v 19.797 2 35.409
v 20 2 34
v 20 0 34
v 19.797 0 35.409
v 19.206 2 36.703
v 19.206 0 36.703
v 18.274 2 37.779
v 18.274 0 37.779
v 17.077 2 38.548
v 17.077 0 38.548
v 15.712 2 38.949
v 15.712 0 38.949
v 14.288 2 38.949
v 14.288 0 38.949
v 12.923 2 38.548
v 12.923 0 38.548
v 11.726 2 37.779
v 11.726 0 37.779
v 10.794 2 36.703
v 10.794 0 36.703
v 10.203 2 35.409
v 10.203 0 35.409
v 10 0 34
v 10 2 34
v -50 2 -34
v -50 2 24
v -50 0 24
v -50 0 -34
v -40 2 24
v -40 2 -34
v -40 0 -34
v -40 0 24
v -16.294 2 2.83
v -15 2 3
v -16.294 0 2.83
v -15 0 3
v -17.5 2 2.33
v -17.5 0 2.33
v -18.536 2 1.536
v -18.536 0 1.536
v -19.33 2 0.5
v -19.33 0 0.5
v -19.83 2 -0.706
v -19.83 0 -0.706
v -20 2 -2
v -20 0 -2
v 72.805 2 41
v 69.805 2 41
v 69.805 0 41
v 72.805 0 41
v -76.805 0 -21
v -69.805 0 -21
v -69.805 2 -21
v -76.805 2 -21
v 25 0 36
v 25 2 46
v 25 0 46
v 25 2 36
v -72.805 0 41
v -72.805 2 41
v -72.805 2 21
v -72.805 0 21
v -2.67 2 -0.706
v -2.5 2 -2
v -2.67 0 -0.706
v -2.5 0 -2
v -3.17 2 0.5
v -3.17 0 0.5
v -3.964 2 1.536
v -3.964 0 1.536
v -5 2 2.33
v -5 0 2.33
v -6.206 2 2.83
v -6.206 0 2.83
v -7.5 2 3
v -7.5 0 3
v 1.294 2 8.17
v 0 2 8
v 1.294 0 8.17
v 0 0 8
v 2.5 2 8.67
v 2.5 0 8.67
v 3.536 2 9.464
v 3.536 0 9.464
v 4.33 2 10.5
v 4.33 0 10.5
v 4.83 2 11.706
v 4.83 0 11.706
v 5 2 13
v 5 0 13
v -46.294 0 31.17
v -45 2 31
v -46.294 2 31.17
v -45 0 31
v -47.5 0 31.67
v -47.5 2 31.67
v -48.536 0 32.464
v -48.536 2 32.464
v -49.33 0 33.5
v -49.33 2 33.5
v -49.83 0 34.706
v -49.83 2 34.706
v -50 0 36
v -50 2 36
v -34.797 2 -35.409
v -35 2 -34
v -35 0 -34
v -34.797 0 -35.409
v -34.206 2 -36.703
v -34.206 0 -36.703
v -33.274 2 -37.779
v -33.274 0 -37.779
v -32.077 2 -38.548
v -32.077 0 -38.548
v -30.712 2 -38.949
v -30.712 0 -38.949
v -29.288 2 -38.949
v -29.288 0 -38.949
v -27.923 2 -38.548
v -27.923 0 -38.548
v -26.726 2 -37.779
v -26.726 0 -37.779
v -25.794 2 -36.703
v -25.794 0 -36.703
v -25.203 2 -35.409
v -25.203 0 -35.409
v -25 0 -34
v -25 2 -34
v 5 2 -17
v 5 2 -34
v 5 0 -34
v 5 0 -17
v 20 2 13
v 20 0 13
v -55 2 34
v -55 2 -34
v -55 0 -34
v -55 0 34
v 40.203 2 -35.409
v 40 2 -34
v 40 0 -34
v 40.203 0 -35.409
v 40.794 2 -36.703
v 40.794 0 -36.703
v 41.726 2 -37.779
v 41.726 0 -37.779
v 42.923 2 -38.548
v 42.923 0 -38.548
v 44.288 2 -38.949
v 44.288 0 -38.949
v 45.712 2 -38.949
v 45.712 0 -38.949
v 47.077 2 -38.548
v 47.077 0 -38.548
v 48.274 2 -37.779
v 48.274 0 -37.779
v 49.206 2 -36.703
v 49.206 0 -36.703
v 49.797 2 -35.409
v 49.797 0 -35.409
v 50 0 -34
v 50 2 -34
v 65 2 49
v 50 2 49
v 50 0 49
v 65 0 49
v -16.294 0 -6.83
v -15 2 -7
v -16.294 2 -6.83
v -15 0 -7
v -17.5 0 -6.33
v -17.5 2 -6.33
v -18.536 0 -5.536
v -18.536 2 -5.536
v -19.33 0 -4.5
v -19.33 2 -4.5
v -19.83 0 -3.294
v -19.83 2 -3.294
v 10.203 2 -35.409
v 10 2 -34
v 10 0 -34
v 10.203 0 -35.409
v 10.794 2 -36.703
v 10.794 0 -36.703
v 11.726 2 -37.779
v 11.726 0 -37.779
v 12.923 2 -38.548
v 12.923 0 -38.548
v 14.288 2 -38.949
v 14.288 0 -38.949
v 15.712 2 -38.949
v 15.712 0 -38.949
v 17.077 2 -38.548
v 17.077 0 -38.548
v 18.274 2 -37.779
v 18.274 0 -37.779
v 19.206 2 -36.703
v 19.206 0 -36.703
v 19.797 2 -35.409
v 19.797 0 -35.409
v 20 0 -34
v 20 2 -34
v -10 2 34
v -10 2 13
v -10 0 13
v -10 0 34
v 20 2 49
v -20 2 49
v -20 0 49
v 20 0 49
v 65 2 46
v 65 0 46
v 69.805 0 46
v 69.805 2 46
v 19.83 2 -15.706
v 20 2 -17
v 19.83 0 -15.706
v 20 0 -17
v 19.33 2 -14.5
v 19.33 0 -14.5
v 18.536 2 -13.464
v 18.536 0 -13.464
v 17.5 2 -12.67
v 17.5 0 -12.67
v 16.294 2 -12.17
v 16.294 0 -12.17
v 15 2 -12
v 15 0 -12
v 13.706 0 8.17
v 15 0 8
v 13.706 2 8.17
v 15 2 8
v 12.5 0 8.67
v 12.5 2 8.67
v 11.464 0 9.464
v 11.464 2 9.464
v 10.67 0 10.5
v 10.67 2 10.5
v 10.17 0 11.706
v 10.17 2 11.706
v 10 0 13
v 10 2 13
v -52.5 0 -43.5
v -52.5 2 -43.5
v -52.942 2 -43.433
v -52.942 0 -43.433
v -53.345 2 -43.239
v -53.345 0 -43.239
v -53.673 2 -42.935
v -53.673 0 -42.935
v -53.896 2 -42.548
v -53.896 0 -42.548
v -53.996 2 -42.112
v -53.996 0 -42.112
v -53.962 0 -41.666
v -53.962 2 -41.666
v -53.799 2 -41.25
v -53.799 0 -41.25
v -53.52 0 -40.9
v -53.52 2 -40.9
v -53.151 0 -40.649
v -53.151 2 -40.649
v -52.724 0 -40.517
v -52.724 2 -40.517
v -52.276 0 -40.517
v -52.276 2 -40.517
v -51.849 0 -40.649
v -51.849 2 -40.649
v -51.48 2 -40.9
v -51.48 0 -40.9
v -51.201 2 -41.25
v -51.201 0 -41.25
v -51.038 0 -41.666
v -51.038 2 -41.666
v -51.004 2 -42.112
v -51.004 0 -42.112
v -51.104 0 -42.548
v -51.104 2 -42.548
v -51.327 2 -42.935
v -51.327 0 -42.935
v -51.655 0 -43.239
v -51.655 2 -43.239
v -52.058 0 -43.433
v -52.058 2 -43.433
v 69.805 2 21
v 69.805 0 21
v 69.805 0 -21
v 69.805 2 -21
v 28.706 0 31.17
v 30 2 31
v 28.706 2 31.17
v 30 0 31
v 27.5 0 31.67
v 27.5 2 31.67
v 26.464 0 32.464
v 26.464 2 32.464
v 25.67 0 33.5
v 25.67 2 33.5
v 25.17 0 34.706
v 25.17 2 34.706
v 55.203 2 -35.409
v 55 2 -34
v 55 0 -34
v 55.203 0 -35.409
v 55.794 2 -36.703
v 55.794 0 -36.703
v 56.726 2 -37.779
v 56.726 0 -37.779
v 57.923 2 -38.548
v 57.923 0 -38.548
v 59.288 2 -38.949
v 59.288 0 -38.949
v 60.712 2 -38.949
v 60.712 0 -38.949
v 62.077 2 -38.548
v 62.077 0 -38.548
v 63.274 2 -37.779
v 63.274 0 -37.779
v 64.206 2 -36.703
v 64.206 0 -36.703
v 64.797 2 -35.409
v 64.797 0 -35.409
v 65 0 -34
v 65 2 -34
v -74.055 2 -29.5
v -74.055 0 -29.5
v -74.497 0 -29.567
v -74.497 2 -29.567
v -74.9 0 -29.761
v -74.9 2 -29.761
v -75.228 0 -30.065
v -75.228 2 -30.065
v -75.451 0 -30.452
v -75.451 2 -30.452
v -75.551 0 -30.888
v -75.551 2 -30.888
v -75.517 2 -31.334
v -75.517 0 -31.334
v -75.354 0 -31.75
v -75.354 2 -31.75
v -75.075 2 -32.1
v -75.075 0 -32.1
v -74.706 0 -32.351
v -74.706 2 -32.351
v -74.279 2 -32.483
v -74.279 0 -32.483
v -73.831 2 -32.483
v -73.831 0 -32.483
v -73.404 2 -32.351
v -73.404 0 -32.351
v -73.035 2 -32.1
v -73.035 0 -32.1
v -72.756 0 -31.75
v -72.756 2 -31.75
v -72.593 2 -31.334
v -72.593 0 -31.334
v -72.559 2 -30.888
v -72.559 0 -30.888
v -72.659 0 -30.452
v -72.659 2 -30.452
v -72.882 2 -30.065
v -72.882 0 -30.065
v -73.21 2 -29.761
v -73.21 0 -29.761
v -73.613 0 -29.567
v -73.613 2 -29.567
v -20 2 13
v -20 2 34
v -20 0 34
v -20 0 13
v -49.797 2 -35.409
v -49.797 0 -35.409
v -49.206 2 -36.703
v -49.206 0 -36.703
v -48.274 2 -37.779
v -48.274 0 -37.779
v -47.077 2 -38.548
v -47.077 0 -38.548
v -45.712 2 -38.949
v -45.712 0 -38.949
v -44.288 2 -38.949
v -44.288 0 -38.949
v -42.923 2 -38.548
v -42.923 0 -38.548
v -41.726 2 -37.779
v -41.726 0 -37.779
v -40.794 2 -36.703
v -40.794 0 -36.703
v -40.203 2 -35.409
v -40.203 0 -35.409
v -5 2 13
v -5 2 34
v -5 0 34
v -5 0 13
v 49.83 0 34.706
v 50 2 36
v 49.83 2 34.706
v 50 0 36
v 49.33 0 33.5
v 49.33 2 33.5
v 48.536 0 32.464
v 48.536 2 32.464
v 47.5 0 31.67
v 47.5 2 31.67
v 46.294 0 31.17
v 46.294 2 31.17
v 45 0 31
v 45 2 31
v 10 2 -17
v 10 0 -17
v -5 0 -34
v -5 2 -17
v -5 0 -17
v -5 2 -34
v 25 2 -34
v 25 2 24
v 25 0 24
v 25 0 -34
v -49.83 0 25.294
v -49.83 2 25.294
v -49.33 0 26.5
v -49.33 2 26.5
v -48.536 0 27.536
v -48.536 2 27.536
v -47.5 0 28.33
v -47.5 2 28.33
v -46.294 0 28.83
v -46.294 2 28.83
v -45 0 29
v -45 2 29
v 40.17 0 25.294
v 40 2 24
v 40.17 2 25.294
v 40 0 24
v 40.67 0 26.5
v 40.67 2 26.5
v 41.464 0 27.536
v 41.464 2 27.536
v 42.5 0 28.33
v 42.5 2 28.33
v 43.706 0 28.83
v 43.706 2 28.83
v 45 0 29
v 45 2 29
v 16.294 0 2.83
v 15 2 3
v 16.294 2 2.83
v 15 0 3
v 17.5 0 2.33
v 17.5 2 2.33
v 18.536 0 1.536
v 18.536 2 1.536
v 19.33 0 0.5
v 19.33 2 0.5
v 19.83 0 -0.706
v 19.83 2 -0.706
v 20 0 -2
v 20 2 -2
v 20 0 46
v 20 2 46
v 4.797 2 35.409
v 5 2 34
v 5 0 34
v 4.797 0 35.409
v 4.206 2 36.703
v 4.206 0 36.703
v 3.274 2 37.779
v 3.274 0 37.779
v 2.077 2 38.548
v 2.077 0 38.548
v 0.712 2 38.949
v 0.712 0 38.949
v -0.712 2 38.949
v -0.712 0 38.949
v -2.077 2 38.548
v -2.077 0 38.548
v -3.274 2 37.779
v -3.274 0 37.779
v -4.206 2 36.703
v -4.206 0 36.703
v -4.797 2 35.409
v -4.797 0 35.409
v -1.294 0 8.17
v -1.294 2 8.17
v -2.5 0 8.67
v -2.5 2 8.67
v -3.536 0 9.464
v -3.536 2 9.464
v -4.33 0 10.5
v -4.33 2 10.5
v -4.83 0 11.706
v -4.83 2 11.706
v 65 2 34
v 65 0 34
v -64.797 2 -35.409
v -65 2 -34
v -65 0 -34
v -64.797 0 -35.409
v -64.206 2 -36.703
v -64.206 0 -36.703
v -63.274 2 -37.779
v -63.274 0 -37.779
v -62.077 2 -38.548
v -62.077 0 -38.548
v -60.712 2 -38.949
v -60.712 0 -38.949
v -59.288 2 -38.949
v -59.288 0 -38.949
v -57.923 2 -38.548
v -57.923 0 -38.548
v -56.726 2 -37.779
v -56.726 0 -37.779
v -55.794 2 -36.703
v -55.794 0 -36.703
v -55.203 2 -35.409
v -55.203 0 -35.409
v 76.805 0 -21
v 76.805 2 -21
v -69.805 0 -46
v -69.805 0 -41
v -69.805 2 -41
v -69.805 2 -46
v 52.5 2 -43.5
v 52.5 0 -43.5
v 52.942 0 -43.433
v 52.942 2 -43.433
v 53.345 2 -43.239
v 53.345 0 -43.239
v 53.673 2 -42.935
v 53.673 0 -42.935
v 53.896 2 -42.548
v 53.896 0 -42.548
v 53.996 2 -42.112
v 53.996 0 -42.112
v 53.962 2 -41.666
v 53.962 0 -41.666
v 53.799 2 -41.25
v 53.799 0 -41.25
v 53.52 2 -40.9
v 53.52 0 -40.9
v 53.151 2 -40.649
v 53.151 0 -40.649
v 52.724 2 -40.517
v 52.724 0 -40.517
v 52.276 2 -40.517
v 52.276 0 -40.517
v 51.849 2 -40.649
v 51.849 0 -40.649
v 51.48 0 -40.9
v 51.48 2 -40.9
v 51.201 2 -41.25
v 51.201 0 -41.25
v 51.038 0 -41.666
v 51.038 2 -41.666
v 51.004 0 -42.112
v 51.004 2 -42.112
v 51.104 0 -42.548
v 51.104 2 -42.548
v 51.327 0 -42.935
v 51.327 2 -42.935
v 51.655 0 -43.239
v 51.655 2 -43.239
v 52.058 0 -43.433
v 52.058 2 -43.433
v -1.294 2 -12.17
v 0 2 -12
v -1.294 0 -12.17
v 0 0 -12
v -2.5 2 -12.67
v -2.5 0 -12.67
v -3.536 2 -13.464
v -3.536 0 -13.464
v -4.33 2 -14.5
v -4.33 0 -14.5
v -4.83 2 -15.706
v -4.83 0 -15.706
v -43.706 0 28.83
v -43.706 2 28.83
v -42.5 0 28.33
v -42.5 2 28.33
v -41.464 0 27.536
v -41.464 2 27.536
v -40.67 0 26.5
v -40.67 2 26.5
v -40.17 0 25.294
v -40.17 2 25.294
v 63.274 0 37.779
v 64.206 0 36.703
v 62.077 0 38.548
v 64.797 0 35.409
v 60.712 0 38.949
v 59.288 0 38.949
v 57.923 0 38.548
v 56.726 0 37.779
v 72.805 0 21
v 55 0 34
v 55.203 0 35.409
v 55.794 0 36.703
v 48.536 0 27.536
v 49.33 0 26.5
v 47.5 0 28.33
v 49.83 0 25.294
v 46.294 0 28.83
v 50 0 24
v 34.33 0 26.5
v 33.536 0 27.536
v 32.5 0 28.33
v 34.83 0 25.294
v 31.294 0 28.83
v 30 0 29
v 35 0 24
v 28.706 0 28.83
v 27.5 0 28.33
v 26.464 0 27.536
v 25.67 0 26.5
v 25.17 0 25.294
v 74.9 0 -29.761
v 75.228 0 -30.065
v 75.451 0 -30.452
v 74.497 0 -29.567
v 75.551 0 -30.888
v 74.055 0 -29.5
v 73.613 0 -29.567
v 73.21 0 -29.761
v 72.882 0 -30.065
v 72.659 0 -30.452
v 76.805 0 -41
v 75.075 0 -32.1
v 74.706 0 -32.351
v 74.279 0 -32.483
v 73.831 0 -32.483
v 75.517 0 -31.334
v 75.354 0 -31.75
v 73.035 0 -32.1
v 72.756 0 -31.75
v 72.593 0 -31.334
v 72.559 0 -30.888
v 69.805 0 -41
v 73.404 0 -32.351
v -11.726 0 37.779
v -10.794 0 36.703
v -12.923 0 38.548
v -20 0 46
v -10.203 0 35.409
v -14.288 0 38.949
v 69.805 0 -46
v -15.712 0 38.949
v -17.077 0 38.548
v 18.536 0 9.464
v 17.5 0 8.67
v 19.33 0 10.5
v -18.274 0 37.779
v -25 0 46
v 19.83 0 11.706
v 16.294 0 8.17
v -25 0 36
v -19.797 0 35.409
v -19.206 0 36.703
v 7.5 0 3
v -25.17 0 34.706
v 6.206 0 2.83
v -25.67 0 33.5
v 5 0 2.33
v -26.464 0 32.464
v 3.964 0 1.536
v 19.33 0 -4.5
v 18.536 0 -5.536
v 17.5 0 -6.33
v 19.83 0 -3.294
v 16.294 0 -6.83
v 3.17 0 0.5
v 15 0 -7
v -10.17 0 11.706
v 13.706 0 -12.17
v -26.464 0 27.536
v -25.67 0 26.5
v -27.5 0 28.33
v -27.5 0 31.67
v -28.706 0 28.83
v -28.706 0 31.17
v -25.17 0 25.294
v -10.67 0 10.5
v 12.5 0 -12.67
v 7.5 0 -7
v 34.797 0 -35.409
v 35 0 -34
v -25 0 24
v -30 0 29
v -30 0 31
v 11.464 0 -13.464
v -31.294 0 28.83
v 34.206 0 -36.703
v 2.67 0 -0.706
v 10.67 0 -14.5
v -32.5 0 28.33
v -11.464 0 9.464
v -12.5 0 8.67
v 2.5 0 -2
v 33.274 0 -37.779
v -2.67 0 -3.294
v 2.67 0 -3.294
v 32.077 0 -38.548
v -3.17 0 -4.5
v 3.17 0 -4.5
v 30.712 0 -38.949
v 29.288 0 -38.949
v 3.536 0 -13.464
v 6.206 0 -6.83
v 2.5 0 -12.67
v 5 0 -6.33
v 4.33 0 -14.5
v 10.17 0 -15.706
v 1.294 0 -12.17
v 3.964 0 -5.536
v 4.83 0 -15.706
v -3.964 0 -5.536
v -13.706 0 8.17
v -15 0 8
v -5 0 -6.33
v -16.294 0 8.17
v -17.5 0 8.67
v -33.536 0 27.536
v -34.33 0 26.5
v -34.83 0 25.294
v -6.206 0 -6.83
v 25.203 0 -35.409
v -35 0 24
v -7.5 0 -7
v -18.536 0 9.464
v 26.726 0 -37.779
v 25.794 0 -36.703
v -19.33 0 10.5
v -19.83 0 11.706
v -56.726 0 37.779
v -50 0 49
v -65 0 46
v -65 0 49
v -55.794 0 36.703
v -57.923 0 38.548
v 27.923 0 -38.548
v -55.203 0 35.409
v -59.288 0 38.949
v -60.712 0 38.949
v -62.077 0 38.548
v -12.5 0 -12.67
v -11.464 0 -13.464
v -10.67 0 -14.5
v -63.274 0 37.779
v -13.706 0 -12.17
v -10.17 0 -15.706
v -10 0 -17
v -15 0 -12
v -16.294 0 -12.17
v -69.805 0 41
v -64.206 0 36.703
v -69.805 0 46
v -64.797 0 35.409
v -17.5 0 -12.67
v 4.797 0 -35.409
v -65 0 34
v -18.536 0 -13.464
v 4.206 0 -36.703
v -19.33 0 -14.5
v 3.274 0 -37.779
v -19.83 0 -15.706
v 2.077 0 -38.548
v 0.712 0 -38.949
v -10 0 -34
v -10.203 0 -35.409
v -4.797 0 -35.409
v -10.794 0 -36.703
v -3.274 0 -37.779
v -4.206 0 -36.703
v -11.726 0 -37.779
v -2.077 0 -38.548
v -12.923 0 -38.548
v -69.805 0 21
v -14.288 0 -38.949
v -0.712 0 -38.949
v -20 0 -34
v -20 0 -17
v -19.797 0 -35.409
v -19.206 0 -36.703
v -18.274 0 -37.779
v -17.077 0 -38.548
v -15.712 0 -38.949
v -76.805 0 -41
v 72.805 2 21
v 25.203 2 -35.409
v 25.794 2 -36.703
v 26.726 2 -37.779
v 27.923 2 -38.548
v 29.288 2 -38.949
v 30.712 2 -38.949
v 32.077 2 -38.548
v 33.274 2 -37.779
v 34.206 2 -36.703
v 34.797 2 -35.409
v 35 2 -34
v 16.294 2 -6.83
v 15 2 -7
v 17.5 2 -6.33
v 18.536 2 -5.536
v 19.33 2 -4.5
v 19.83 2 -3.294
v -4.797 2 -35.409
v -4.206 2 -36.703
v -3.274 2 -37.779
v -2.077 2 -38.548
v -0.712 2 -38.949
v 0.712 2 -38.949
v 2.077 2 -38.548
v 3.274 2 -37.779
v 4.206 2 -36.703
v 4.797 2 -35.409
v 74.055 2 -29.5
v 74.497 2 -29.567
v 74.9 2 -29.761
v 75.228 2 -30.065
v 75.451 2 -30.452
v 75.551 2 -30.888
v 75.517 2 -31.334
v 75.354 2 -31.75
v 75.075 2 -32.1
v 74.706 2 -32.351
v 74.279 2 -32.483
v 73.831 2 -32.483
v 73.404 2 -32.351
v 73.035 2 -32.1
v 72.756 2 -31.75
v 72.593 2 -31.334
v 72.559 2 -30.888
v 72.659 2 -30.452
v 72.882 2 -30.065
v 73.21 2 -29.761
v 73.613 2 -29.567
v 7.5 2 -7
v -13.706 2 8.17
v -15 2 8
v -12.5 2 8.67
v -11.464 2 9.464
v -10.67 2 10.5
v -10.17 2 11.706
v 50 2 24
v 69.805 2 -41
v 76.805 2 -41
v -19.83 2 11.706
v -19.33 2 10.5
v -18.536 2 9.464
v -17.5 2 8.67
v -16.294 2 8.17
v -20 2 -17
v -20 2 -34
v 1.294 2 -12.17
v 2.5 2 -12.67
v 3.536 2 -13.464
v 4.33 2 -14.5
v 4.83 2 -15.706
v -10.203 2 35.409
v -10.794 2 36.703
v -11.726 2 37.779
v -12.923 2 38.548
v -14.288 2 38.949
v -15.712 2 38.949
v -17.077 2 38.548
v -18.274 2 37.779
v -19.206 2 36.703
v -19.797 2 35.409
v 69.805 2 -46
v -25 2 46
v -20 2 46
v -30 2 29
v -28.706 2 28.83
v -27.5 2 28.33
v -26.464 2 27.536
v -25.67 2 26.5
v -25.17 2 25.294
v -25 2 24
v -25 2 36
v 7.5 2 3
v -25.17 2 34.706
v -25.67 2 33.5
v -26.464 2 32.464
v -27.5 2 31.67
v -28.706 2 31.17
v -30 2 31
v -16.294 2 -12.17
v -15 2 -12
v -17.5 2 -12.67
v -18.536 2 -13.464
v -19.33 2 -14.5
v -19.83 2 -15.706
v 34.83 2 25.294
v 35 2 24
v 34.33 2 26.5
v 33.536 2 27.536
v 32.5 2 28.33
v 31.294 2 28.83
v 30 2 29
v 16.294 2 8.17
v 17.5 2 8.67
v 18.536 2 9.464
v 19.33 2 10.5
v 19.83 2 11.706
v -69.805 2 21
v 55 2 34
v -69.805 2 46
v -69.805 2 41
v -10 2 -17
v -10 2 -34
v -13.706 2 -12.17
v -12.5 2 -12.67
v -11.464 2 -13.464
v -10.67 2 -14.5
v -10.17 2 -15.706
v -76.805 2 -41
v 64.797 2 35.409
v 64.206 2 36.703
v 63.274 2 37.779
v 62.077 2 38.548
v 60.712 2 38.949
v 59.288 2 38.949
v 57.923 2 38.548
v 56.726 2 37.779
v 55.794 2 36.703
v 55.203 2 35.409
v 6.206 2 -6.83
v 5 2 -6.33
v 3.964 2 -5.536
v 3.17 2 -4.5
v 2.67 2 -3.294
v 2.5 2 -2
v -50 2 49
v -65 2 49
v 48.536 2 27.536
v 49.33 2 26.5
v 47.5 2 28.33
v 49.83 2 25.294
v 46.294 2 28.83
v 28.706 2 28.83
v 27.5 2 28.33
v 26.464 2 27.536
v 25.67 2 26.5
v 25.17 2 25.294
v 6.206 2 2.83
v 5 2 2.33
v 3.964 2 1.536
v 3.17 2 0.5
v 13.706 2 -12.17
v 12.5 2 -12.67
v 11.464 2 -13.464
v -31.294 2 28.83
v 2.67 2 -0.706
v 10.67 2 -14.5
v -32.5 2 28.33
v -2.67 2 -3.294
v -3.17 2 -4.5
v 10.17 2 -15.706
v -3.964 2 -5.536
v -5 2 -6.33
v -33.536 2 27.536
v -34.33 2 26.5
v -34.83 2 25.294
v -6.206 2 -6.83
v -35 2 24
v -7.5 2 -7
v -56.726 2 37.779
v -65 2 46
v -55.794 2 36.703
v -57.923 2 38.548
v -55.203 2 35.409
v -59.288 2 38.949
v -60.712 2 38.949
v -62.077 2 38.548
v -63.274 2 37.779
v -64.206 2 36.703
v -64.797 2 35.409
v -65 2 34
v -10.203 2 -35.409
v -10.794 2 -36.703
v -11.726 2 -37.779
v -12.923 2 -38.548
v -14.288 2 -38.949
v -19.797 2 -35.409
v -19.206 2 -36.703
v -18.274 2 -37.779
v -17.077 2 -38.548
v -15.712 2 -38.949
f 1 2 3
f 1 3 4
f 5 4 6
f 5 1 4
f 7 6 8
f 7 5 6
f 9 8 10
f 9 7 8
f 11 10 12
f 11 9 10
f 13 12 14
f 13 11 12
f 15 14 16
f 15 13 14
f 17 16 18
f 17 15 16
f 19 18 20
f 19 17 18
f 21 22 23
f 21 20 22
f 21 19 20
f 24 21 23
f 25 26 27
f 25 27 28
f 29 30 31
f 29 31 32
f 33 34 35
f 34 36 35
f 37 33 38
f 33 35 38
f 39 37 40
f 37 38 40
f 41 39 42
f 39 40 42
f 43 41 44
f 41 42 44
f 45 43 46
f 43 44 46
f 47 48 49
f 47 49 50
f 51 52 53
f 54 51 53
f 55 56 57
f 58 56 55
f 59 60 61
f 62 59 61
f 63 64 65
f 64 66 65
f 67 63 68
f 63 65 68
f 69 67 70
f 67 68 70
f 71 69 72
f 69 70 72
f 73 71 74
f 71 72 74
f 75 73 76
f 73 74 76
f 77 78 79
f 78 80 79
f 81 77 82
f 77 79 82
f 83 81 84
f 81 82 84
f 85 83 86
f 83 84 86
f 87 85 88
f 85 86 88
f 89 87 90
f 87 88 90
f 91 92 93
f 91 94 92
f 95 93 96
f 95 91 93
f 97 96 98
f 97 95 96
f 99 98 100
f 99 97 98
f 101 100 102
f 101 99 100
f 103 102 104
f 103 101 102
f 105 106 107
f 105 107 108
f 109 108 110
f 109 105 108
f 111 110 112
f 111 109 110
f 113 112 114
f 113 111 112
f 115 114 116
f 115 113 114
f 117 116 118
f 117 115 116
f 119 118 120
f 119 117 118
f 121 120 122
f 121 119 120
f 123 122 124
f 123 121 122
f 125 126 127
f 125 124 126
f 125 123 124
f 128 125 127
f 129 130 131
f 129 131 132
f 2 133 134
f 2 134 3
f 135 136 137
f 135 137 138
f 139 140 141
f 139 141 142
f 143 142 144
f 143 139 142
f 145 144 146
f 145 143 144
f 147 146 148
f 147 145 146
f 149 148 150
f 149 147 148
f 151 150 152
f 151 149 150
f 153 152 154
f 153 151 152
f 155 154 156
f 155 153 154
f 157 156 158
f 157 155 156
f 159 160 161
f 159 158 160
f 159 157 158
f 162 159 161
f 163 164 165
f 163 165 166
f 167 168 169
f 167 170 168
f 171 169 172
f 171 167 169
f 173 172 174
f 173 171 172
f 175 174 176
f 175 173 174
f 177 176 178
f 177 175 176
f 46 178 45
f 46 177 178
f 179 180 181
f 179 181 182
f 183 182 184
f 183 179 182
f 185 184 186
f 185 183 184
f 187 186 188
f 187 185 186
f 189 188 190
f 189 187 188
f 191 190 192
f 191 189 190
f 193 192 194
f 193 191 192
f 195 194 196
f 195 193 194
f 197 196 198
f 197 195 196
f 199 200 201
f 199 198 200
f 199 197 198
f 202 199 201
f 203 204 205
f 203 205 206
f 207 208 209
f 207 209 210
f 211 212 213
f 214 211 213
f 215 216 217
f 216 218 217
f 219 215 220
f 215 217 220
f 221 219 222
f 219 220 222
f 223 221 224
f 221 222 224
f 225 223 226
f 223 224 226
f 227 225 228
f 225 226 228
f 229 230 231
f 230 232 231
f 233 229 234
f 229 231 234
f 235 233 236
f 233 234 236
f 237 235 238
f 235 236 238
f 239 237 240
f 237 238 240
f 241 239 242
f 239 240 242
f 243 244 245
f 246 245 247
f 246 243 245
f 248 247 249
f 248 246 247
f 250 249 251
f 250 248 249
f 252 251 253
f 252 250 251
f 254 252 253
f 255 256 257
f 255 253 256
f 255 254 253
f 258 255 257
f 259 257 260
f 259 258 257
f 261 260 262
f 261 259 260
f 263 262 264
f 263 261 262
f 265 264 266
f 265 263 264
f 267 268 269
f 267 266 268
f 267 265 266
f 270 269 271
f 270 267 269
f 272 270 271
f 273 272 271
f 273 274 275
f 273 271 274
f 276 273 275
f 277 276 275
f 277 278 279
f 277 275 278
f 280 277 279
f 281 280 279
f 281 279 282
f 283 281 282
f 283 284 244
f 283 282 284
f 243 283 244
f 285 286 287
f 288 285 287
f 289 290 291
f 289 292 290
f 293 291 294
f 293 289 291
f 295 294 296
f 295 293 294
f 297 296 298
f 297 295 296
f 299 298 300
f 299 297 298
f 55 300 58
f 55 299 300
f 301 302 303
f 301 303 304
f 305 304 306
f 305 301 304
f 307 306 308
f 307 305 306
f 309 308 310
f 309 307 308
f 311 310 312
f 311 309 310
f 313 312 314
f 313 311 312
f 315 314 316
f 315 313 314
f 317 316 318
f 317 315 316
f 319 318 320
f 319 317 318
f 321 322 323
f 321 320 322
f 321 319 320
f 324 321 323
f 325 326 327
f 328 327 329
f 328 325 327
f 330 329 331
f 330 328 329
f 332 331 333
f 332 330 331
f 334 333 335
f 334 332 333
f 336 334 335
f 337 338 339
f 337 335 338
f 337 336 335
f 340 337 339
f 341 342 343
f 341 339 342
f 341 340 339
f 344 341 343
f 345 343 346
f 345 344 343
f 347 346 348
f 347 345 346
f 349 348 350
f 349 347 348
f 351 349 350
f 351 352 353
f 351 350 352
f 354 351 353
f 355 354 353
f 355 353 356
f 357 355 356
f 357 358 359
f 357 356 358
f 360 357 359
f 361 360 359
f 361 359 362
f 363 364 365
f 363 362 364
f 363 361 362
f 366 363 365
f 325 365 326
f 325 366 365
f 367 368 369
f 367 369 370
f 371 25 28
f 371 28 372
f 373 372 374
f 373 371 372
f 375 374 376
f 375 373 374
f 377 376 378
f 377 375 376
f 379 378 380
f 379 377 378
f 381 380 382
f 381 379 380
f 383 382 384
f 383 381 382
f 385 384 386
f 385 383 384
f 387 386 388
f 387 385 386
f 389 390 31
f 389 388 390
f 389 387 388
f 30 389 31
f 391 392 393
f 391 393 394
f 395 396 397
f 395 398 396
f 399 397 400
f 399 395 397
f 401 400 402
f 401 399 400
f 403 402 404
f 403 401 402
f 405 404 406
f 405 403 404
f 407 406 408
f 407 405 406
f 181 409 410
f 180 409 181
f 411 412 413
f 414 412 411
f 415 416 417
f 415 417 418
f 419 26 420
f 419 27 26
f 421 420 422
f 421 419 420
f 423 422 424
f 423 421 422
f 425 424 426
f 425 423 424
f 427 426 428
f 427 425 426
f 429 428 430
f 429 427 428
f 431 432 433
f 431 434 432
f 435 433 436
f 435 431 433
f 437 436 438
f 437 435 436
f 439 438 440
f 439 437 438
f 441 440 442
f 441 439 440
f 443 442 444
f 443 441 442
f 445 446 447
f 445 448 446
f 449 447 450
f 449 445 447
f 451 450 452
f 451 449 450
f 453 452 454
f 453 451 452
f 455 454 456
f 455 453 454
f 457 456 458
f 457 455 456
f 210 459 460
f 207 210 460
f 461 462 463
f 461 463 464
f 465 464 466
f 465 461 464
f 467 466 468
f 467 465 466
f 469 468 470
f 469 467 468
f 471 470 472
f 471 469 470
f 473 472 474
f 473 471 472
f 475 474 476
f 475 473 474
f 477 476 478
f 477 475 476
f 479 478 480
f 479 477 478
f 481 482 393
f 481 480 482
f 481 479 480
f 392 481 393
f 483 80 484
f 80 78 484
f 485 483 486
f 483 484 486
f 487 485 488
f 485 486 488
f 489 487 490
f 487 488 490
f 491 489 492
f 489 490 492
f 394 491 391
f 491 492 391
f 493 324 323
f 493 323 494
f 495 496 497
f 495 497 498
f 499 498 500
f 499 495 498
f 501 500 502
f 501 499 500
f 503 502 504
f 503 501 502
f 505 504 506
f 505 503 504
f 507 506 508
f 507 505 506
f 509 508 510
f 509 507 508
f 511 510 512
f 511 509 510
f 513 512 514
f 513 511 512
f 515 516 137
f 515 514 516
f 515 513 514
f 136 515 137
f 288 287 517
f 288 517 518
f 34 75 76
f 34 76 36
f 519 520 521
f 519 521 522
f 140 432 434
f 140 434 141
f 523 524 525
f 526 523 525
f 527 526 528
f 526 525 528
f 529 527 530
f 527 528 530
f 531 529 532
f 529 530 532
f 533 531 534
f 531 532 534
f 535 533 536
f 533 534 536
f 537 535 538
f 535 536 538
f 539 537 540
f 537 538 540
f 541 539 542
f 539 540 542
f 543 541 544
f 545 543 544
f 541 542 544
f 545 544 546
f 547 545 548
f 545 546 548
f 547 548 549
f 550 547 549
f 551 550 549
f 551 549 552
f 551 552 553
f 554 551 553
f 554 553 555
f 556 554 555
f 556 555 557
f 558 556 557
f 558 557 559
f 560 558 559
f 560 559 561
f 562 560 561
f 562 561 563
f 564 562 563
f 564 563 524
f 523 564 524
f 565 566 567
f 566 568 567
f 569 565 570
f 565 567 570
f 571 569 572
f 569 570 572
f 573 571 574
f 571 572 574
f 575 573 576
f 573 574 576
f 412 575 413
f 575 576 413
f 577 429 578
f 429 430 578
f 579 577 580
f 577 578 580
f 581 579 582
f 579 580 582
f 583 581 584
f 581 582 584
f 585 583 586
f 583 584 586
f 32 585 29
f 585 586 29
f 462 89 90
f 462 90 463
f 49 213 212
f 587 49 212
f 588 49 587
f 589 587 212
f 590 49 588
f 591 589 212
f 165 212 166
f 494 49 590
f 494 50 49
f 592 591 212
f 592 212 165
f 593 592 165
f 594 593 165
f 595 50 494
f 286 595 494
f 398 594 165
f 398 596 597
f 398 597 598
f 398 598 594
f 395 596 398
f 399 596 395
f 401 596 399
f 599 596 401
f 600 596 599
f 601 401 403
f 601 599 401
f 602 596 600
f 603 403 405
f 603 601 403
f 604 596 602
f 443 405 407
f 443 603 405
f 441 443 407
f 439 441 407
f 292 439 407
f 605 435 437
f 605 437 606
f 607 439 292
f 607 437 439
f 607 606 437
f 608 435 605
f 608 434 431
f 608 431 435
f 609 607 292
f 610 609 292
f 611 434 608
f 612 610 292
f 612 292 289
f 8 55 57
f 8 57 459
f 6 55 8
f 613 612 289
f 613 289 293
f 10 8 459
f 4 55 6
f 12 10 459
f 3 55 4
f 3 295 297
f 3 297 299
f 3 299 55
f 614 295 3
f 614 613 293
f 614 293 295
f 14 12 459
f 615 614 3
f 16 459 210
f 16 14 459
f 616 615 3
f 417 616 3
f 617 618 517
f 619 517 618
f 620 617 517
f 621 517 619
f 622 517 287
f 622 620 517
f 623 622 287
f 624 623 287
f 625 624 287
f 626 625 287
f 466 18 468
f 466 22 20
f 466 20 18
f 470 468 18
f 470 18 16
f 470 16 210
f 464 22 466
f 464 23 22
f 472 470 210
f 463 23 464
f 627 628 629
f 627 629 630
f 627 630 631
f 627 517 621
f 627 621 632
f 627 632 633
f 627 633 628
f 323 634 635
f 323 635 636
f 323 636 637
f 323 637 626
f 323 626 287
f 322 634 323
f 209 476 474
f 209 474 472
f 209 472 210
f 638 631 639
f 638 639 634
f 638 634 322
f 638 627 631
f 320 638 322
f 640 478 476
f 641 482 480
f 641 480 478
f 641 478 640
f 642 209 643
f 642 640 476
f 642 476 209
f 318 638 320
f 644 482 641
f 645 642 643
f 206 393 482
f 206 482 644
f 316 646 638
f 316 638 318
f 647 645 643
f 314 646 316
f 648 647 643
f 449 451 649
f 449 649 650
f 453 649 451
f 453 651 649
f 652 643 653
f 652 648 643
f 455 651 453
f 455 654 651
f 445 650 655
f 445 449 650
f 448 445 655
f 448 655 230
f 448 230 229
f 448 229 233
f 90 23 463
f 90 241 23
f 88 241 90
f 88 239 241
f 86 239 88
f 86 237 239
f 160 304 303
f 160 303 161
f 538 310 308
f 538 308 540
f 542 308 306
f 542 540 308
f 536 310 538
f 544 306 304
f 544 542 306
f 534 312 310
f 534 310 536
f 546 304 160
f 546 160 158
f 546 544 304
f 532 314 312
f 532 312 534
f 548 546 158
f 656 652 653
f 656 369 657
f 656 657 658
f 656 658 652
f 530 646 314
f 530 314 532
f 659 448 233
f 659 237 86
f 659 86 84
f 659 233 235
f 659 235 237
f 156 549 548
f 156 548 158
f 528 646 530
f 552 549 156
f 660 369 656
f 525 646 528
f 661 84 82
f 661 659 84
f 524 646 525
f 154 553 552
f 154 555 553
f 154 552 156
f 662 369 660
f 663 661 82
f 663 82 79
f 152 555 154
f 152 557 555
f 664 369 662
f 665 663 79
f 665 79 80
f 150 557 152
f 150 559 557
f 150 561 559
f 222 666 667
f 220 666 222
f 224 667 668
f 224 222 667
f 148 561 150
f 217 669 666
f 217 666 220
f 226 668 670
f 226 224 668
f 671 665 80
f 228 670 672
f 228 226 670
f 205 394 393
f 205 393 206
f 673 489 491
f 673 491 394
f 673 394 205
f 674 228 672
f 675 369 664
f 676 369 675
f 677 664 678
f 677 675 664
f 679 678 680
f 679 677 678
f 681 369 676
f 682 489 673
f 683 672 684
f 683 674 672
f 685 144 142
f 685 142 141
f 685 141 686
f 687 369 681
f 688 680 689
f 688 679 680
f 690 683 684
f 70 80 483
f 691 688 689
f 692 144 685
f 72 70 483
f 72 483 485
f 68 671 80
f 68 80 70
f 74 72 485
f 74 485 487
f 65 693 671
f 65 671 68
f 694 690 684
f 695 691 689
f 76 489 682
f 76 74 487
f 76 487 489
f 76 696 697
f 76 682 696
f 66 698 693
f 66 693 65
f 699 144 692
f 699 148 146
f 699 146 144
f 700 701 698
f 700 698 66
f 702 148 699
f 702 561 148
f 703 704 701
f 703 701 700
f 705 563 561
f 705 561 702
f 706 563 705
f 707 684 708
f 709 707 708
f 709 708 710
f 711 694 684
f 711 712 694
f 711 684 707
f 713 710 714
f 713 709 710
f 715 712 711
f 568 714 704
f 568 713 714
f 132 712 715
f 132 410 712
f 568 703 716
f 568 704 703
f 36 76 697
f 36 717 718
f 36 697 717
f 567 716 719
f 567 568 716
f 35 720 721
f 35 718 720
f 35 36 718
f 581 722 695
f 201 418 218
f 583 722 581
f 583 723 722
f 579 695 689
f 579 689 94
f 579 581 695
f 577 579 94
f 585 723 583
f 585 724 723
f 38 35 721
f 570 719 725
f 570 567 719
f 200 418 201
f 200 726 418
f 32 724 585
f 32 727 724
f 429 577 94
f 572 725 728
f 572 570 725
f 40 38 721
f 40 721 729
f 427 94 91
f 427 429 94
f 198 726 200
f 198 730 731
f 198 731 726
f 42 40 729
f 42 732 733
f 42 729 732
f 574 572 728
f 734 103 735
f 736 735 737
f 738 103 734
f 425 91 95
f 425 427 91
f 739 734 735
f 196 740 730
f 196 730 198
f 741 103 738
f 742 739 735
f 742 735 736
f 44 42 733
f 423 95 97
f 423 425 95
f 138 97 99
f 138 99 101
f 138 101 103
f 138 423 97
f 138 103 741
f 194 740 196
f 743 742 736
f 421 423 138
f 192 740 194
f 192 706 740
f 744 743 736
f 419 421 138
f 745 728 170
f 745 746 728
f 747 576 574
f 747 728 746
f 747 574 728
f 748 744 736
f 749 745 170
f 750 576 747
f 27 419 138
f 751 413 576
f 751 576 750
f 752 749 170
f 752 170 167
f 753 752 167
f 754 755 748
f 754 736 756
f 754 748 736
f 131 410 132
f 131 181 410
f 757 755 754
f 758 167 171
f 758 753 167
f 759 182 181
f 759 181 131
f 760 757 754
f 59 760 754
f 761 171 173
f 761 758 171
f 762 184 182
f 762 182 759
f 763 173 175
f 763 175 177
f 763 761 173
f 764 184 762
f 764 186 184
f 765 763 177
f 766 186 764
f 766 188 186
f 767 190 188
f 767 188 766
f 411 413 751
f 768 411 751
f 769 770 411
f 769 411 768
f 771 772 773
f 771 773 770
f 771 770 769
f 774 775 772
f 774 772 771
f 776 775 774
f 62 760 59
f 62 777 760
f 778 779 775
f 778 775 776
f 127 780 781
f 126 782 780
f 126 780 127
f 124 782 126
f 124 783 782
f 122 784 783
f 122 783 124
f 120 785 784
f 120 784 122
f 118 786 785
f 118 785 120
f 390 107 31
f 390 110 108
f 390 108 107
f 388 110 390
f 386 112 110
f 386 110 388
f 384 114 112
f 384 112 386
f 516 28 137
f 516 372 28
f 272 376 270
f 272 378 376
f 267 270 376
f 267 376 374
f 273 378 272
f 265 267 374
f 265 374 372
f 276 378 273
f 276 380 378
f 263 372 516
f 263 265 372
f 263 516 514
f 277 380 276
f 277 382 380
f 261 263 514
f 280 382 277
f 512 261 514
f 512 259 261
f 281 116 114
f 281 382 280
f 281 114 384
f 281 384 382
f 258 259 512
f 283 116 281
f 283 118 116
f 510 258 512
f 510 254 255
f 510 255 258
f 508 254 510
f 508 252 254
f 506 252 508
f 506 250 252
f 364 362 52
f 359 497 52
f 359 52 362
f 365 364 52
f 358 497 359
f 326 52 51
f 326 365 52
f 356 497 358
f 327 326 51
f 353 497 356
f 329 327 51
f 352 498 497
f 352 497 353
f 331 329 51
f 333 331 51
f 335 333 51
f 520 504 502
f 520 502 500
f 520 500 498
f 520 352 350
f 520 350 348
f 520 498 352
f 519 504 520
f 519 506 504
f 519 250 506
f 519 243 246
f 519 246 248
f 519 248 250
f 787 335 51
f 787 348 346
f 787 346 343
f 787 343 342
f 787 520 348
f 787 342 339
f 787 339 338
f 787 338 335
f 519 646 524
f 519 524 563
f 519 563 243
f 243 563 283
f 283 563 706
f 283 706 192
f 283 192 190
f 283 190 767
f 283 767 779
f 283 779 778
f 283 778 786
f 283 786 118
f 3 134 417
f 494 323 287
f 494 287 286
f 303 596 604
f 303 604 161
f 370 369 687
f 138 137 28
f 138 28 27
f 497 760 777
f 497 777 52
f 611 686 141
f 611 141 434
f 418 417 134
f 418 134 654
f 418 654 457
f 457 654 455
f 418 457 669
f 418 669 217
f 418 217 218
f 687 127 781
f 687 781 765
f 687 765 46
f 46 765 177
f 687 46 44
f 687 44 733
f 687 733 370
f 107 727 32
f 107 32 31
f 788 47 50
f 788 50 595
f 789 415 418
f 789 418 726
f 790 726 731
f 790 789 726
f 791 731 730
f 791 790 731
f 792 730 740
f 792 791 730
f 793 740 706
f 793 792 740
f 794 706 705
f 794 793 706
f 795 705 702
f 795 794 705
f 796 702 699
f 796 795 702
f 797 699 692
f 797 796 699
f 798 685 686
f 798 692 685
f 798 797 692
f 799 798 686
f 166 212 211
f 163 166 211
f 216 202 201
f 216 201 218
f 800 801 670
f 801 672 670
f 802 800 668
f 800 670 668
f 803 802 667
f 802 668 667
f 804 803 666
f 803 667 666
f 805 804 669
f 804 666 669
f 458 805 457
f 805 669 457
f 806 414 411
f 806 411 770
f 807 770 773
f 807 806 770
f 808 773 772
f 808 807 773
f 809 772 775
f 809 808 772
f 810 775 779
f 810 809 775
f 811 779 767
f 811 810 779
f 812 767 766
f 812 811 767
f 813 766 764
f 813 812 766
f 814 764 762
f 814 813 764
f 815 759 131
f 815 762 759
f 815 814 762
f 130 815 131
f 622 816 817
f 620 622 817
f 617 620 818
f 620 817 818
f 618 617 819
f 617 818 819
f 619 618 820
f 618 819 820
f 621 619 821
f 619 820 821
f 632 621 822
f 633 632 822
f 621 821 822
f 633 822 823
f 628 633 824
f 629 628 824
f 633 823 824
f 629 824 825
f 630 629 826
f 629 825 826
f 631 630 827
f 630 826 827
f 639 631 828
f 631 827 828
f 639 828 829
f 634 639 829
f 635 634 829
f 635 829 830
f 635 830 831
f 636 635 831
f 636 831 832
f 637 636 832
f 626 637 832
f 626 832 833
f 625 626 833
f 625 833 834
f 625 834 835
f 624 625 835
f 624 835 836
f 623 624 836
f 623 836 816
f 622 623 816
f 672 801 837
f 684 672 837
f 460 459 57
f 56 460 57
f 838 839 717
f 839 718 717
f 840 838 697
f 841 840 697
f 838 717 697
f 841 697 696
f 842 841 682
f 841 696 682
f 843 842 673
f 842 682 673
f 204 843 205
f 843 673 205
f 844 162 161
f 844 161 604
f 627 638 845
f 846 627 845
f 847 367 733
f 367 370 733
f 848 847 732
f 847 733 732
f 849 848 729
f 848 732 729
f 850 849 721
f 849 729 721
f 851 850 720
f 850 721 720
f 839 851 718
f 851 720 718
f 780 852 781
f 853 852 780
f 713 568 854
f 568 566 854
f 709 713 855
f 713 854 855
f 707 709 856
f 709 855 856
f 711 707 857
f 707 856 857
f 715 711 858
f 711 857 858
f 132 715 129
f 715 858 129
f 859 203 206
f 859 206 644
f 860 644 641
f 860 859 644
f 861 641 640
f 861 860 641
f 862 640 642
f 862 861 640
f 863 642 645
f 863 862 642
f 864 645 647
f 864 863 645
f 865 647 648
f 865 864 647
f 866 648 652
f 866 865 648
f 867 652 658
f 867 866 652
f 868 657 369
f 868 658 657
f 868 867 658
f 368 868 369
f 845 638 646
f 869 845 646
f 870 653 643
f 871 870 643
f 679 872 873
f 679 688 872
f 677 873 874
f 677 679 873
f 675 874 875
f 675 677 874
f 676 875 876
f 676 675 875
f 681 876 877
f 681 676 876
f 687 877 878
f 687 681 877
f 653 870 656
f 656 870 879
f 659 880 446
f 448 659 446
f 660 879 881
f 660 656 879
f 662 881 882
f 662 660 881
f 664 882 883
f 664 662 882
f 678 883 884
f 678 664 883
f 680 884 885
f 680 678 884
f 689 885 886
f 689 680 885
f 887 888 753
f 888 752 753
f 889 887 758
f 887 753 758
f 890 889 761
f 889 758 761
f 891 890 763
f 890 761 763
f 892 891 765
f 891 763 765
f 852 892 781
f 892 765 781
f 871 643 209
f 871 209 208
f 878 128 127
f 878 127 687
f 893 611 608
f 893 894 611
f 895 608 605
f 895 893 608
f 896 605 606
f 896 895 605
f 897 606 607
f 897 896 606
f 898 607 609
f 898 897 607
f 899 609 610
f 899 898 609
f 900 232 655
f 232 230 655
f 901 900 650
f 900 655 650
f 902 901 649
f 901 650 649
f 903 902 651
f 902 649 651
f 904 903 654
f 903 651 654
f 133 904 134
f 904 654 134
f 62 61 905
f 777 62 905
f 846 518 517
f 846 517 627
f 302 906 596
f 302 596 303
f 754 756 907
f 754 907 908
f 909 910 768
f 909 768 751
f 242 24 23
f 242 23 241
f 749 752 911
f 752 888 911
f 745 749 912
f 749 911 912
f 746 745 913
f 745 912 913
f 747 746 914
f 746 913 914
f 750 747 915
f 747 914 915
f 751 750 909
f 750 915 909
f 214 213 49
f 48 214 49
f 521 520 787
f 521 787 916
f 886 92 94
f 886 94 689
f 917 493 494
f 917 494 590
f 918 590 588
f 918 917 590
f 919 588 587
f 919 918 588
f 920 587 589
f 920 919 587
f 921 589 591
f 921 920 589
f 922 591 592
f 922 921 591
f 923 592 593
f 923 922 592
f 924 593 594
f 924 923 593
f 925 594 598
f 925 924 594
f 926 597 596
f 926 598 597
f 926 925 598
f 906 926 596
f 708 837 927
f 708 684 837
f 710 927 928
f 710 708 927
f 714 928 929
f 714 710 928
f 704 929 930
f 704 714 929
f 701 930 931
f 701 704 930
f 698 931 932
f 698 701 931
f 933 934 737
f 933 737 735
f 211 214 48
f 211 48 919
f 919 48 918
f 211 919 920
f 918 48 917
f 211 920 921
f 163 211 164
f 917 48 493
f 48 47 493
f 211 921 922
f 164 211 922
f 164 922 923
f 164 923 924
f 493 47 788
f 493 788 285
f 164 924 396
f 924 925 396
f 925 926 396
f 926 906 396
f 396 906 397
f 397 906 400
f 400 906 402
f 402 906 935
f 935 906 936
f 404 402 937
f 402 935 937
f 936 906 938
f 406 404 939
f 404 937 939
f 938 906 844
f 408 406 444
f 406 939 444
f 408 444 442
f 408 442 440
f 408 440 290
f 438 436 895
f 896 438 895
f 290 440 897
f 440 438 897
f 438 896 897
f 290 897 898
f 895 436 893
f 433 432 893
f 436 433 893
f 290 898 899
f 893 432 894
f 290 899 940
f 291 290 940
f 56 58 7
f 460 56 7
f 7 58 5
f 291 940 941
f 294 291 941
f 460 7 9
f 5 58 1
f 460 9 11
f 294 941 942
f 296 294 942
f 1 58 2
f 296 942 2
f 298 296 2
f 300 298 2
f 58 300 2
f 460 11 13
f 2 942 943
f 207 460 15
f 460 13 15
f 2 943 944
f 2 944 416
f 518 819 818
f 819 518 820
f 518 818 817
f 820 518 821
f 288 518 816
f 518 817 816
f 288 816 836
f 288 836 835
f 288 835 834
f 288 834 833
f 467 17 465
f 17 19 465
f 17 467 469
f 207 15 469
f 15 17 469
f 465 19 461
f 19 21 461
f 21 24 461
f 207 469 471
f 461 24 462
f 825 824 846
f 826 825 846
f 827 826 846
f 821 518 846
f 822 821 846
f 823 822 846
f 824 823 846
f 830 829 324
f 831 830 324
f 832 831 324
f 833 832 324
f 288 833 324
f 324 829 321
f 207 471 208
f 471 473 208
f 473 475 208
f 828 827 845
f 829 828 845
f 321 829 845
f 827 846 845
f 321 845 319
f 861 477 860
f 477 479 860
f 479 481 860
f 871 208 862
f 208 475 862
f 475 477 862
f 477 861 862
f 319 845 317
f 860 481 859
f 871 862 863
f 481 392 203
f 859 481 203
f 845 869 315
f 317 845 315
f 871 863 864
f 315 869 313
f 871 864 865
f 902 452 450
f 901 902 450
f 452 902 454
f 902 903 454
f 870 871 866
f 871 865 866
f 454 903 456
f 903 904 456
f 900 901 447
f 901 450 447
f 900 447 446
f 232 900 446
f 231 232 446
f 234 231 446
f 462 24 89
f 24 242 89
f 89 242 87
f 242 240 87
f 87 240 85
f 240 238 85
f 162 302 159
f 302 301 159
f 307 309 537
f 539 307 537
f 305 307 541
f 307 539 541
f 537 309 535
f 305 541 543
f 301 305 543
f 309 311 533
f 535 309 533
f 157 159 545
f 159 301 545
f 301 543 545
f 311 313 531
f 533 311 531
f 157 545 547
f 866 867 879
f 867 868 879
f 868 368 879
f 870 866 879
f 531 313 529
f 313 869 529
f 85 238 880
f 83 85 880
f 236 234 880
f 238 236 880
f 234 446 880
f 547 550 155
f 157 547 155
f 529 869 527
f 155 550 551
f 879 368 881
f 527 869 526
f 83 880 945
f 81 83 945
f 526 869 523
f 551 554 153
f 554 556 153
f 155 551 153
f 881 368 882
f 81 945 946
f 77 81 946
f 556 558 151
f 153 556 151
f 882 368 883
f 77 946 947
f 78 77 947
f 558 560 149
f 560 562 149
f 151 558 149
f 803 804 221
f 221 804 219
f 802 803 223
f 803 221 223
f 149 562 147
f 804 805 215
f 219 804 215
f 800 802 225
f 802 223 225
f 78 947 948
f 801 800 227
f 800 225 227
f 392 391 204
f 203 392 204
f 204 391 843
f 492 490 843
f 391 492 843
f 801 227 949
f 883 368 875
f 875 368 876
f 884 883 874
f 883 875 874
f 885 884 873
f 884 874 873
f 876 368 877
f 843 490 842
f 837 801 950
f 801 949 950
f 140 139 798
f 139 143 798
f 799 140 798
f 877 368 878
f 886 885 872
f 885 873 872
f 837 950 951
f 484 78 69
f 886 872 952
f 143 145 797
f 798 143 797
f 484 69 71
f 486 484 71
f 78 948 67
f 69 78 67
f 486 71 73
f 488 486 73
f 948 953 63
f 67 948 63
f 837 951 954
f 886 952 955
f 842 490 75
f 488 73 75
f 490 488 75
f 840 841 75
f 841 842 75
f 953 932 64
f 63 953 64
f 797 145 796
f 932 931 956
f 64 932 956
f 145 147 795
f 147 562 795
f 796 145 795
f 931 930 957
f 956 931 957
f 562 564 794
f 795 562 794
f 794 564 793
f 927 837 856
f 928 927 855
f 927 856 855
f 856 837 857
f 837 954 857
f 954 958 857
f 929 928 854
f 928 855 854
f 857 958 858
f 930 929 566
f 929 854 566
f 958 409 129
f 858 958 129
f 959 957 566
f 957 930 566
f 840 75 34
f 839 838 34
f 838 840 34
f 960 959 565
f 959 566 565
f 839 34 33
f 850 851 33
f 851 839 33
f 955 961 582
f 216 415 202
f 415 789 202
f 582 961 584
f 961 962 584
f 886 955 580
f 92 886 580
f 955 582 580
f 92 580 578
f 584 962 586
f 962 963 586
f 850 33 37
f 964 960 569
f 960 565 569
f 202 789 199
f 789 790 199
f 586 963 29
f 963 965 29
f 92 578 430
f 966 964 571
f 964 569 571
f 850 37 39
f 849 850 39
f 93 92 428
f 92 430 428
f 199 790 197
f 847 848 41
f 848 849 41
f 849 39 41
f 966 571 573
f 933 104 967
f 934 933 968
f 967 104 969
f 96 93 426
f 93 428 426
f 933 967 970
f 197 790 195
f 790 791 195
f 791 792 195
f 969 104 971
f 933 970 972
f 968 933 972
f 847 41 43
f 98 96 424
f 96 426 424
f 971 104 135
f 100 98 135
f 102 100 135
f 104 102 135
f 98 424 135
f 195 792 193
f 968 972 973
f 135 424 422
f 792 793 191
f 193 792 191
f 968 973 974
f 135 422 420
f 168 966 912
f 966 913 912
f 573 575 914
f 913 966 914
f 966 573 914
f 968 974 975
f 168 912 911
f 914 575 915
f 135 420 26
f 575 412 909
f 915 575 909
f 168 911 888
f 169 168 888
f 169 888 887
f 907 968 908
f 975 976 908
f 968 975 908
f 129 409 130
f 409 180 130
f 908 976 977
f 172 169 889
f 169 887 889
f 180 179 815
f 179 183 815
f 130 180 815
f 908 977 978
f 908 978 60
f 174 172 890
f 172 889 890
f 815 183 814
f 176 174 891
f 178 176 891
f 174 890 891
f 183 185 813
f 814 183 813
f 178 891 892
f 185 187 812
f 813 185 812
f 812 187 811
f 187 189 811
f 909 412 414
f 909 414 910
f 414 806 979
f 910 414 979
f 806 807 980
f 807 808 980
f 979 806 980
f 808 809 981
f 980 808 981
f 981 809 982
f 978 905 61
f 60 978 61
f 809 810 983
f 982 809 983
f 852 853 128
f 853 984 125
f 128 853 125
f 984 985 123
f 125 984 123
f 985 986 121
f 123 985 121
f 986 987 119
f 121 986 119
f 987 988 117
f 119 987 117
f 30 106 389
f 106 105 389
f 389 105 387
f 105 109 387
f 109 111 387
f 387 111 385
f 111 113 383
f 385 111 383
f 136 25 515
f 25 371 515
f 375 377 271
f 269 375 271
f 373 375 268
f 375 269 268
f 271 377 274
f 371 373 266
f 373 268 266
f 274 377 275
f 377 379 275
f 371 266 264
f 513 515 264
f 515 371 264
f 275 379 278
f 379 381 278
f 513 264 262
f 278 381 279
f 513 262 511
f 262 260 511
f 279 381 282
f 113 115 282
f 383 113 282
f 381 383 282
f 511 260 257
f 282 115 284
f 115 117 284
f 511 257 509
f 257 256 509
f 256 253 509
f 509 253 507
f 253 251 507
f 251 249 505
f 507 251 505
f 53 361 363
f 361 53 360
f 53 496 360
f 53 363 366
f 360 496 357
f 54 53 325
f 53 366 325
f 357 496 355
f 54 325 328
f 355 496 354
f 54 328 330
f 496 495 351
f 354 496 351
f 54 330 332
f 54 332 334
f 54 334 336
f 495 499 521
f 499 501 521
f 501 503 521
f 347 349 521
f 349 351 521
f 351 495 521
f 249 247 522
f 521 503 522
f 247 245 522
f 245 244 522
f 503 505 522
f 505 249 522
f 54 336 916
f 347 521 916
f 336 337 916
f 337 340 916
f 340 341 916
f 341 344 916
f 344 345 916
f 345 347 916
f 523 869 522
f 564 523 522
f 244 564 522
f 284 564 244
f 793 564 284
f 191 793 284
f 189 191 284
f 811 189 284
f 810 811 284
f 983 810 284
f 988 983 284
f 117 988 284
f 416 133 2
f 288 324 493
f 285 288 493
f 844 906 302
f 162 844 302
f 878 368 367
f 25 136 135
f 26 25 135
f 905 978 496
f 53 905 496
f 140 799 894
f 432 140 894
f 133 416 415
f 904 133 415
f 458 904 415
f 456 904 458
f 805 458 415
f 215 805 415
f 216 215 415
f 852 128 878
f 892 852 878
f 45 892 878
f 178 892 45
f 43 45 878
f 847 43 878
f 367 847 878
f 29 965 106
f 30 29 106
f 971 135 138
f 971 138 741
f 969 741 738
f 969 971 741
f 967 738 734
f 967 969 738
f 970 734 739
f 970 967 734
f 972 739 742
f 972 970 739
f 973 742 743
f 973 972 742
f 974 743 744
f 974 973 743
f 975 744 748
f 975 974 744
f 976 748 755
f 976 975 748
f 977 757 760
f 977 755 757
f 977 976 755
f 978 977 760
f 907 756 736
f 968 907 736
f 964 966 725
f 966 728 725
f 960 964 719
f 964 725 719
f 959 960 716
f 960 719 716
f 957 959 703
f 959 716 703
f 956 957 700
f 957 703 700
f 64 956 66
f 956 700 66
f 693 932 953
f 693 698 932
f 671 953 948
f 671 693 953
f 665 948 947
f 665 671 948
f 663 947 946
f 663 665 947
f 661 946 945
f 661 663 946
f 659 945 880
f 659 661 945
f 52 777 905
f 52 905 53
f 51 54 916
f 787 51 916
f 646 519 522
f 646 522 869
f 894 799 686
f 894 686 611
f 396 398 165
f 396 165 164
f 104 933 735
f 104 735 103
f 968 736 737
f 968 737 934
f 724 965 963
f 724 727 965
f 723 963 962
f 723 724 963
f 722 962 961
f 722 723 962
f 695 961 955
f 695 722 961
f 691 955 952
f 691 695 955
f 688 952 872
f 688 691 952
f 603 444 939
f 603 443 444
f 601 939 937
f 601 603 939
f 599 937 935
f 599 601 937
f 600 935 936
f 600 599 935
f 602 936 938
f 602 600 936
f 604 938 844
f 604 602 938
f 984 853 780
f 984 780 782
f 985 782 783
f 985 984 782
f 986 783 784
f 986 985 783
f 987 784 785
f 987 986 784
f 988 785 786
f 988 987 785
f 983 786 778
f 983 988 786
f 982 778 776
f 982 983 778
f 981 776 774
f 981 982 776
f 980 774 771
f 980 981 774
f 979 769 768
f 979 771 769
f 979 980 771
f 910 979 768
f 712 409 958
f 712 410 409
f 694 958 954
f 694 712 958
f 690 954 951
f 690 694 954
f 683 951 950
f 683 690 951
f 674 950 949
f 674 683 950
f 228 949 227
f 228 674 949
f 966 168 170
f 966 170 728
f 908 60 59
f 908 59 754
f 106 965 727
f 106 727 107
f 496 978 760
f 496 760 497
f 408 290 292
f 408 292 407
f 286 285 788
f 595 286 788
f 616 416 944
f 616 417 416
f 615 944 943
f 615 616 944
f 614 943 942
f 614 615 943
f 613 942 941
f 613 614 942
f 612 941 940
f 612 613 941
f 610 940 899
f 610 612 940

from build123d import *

# Parameters (mm, degrees)
SKETCH_1_W             = 139.61
SKETCH_1_H             = 92
EXTRUDE_1_DEPTH        = 2
SKETCH_2_W             = 40
SKETCH_2_H             = 2
SKETCH_2_W_2           = 15
EXTRUDE_2_DEPTH        = 3
SKETCH_3_W             = 20
SKETCH_3_H             = 2
EXTRUDE_3_DEPTH        = 7
SKETCH_4_R             = 1.5
CUT_EXTRUDE_1_DEPTH    = 92.126330031
CUT_EXTRUDE_2_DEPTH    = 92.126330031
PATTERN_LINEAR_1_COUNT = 9
PATTERN_LINEAR_1_PITCH = 15
SKETCH_8_R             = 1.5
CUT_EXTRUDE_4_DEPTH    = 92.126330031
SKETCH_10_W            = 25
SKETCH_10_H            = 5
EXTRUDE_5_DEPTH        = 2
SKETCH_12_W            = 25
SKETCH_12_H            = 15
CUT_EXTRUDE_5_DEPTH    = 92.126330031
FILLET_1_R             = 5
CUT_EXTRUDE_6_DEPTH    = 92.126330031
EXTRUDE_6_DEPTH        = 2
FILLET_2_R             = 5
SKETCH_15_W            = 3
SKETCH_15_H            = 20
EXTRUDE_7_DEPTH        = 2


with BuildPart() as part:
    # 草图1 → 凸台-拉伸1 (new body)
    with BuildSketch(Plane(origin=(0, 0, 0), x_dir=(1, 0, 0), z_dir=(0, 1, 0))):
        Rectangle(SKETCH_1_W, SKETCH_1_H)
    extrude(amount=EXTRUDE_1_DEPTH)

    # 草图2 → 凸台-拉伸2 (add)
    with BuildSketch(Plane.XY.offset(46)):
        with Locations((0, 1)):
            Rectangle(SKETCH_2_W, SKETCH_2_H)
        with Locations((57.5, 1)):
            Rectangle(SKETCH_2_W_2, SKETCH_2_H)
        with Locations((-57.5, 1)):
            Rectangle(SKETCH_2_W_2, SKETCH_2_H)
    extrude(amount=EXTRUDE_2_DEPTH)

    # 草图3 → 凸台-拉伸3 (add)
    with BuildSketch(Plane(origin=(69.805, 0, 0), x_dir=(0, 0, -1), z_dir=(1, 0, 0))):
        with Locations((31, 1)):
            Rectangle(SKETCH_3_W, SKETCH_3_H)
    extrude_3 = extrude(amount=EXTRUDE_3_DEPTH)

    # 草图4 → 切除-拉伸1 (cut, through all)
    with BuildSketch(Plane(origin=(0, 2, 0), x_dir=(1, 0, 0), z_dir=(0, 1, 0))):
        with Locations(Location((74.055, 31, 0), (0, 0, 270))):
            Circle(SKETCH_4_R)
    cut_extrude_1 = extrude(amount=-CUT_EXTRUDE_1_DEPTH, mode=Mode.SUBTRACT)

    # 草图5 → 切除-拉伸2 (cut, through all)
    with BuildSketch(Plane(origin=(0, 2, 0), x_dir=(1, 0, 0), z_dir=(0, 1, 0))):
        with BuildLine():
            Line((-65, -34), (-65, 34))
            ThreePointArc((-65, 34), (-60, 39), (-55, 34))
            Line((-55, 34), (-55, -34))
            ThreePointArc((-55, -34), (-60, -39), (-65, -34))
        make_face()
    cut_extrude_2 = extrude(amount=-CUT_EXTRUDE_2_DEPTH, mode=Mode.SUBTRACT)

    # 阵列(线性)1: 切除-拉伸2 ×9
    with Locations(*[(i * PATTERN_LINEAR_1_PITCH, 0, 0) for i in range(1, PATTERN_LINEAR_1_COUNT)]):
        add(cut_extrude_2, mode=Mode.SUBTRACT)

    # 草图8 → 切除-拉伸4 (cut, through all)
    with BuildSketch(Plane.XZ):
        with Locations(Location((52.5, -42, 0), (0, 0, 270))):
            Circle(SKETCH_8_R)
    cut_extrude_4 = extrude(amount=-CUT_EXTRUDE_4_DEPTH, mode=Mode.SUBTRACT)

    # 镜向4: 切除-拉伸4 across plane
    add(cut_extrude_4.mirror(Plane(origin=(0, 0, 0), x_dir=(0, 0, 1), z_dir=(1, 0, 0))), mode=Mode.SUBTRACT)

    # 草图10 → 凸台-拉伸5 (add)
    with BuildSketch(Plane(origin=(0, 2, 0), x_dir=(1, 0, 0), z_dir=(0, 1, 0))):
        with Locations((37.5, -31.5)):
            Rectangle(SKETCH_10_W, SKETCH_10_H)
        with Locations((-37.5, -31.5)):
            Rectangle(SKETCH_10_W, SKETCH_10_H)
    extrude(amount=-EXTRUDE_5_DEPTH)

    # 草图12 → 切除-拉伸5 (cut, through all)
    with BuildSketch(Plane(origin=(0, 2, 0), x_dir=(1, 0, 0), z_dir=(0, 1, 0))):
        with Locations((-37.5, -38.5)):
            Rectangle(SKETCH_12_W, SKETCH_12_H)
        with Locations((37.5, -38.5)):
            Rectangle(SKETCH_12_W, SKETCH_12_H)
    extrude(amount=-CUT_EXTRUDE_5_DEPTH, mode=Mode.SUBTRACT)

    # 圆角1
    fillet_1_edges = [part.edges().sort_by_distance(p)[0] for p in [
        (-40, 1, 29),
        (-50, 1, 29),
        (-25, 1, 31),
        (-50, 1, 31),
        (50, 1, 31),
        (25, 1, 31),
        (50, 1, 29),
        (40, 1, 29),
        (35, 1, 29),
        (25, 1, 29),
        (-25, 1, 29),
        (-35, 1, 29),
    ]]
    fillet(fillet_1_edges, radius=FILLET_1_R - 0.0001)  # a hair under: the kernel refuses the full size

    # 草图13 → 切除-拉伸6 (cut, through all)
    with BuildSketch(Plane(origin=(0, 2, 0), x_dir=(1, 0, 0), z_dir=(0, 1, 0))):
        with BuildLine():
            Line((-10, 7), (10, 7))
            ThreePointArc((10, 7), (15, 2), (10, -3))
            Line((10, -3), (-10, -3))
            ThreePointArc((-10, -3), (-15, 2), (-10, 7))
        make_face()
    extrude(amount=-CUT_EXTRUDE_6_DEPTH, mode=Mode.SUBTRACT)

    # 草图14 → 凸台-拉伸6 (add)
    with BuildSketch(Plane(origin=(0, 2, 0), x_dir=(1, 0, 0), z_dir=(0, 1, 0))):
        Polygon((20, 7), (2.5, 7), (2.5, -3), (20, -3), (20, -8), (-20, -8), (-20, -3), (-2.5, -3), (-2.5, 7), (-20, 7), (-20, 12), (20, 12), align=None)
    extrude(amount=-EXTRUDE_6_DEPTH)

    # 圆角2
    fillet_2_edges = [part.edges().sort_by_distance(p)[0] for p in [
        (-10, 1, -12),
        (-20, 1, -12),
        (-5, 1, -12),
        (5, 1, -12),
        (10, 1, -12),
        (20, 1, -12),
        (20, 1, 3),
        (20, 1, -7),
        (20, 1, 8),
        (10, 1, 8),
        (-5, 1, 8),
        (5, 1, 8),
        (-10, 1, 8),
        (-20, 1, 8),
        (2.5, 1, 3),
        (2.5, 1, -7),
        (-2.5, 1, 3),
        (-2.5, 1, -7),
        (-20, 1, 3),
        (-20, 1, -7),
    ]]
    fillet(fillet_2_edges, radius=FILLET_2_R - 0.0001)  # a hair under: the kernel refuses the full size

    # 镜向5: 凸台-拉伸3, 切除-拉伸1 across plane
    add(extrude_3.mirror(Plane(origin=(0, 0, 0), x_dir=(0, 0, 1), z_dir=(1, 0, 0))))
    add(cut_extrude_1.mirror(Plane(origin=(0, 0, 0), x_dir=(0, 0, 1), z_dir=(1, 0, 0))), mode=Mode.SUBTRACT)

    # 草图15 → 凸台-拉伸7 (add)
    with BuildSketch(Plane(origin=(0, 2, 0), x_dir=(1, 0, 0), z_dir=(0, 1, 0))):
        with Locations((71.305, -31)):
            Rectangle(SKETCH_15_W, SKETCH_15_H)
        with Locations((-71.305, -31)):
            Rectangle(SKETCH_15_W, SKETCH_15_H)
    extrude(amount=-EXTRUDE_7_DEPTH)


solid = part.part
